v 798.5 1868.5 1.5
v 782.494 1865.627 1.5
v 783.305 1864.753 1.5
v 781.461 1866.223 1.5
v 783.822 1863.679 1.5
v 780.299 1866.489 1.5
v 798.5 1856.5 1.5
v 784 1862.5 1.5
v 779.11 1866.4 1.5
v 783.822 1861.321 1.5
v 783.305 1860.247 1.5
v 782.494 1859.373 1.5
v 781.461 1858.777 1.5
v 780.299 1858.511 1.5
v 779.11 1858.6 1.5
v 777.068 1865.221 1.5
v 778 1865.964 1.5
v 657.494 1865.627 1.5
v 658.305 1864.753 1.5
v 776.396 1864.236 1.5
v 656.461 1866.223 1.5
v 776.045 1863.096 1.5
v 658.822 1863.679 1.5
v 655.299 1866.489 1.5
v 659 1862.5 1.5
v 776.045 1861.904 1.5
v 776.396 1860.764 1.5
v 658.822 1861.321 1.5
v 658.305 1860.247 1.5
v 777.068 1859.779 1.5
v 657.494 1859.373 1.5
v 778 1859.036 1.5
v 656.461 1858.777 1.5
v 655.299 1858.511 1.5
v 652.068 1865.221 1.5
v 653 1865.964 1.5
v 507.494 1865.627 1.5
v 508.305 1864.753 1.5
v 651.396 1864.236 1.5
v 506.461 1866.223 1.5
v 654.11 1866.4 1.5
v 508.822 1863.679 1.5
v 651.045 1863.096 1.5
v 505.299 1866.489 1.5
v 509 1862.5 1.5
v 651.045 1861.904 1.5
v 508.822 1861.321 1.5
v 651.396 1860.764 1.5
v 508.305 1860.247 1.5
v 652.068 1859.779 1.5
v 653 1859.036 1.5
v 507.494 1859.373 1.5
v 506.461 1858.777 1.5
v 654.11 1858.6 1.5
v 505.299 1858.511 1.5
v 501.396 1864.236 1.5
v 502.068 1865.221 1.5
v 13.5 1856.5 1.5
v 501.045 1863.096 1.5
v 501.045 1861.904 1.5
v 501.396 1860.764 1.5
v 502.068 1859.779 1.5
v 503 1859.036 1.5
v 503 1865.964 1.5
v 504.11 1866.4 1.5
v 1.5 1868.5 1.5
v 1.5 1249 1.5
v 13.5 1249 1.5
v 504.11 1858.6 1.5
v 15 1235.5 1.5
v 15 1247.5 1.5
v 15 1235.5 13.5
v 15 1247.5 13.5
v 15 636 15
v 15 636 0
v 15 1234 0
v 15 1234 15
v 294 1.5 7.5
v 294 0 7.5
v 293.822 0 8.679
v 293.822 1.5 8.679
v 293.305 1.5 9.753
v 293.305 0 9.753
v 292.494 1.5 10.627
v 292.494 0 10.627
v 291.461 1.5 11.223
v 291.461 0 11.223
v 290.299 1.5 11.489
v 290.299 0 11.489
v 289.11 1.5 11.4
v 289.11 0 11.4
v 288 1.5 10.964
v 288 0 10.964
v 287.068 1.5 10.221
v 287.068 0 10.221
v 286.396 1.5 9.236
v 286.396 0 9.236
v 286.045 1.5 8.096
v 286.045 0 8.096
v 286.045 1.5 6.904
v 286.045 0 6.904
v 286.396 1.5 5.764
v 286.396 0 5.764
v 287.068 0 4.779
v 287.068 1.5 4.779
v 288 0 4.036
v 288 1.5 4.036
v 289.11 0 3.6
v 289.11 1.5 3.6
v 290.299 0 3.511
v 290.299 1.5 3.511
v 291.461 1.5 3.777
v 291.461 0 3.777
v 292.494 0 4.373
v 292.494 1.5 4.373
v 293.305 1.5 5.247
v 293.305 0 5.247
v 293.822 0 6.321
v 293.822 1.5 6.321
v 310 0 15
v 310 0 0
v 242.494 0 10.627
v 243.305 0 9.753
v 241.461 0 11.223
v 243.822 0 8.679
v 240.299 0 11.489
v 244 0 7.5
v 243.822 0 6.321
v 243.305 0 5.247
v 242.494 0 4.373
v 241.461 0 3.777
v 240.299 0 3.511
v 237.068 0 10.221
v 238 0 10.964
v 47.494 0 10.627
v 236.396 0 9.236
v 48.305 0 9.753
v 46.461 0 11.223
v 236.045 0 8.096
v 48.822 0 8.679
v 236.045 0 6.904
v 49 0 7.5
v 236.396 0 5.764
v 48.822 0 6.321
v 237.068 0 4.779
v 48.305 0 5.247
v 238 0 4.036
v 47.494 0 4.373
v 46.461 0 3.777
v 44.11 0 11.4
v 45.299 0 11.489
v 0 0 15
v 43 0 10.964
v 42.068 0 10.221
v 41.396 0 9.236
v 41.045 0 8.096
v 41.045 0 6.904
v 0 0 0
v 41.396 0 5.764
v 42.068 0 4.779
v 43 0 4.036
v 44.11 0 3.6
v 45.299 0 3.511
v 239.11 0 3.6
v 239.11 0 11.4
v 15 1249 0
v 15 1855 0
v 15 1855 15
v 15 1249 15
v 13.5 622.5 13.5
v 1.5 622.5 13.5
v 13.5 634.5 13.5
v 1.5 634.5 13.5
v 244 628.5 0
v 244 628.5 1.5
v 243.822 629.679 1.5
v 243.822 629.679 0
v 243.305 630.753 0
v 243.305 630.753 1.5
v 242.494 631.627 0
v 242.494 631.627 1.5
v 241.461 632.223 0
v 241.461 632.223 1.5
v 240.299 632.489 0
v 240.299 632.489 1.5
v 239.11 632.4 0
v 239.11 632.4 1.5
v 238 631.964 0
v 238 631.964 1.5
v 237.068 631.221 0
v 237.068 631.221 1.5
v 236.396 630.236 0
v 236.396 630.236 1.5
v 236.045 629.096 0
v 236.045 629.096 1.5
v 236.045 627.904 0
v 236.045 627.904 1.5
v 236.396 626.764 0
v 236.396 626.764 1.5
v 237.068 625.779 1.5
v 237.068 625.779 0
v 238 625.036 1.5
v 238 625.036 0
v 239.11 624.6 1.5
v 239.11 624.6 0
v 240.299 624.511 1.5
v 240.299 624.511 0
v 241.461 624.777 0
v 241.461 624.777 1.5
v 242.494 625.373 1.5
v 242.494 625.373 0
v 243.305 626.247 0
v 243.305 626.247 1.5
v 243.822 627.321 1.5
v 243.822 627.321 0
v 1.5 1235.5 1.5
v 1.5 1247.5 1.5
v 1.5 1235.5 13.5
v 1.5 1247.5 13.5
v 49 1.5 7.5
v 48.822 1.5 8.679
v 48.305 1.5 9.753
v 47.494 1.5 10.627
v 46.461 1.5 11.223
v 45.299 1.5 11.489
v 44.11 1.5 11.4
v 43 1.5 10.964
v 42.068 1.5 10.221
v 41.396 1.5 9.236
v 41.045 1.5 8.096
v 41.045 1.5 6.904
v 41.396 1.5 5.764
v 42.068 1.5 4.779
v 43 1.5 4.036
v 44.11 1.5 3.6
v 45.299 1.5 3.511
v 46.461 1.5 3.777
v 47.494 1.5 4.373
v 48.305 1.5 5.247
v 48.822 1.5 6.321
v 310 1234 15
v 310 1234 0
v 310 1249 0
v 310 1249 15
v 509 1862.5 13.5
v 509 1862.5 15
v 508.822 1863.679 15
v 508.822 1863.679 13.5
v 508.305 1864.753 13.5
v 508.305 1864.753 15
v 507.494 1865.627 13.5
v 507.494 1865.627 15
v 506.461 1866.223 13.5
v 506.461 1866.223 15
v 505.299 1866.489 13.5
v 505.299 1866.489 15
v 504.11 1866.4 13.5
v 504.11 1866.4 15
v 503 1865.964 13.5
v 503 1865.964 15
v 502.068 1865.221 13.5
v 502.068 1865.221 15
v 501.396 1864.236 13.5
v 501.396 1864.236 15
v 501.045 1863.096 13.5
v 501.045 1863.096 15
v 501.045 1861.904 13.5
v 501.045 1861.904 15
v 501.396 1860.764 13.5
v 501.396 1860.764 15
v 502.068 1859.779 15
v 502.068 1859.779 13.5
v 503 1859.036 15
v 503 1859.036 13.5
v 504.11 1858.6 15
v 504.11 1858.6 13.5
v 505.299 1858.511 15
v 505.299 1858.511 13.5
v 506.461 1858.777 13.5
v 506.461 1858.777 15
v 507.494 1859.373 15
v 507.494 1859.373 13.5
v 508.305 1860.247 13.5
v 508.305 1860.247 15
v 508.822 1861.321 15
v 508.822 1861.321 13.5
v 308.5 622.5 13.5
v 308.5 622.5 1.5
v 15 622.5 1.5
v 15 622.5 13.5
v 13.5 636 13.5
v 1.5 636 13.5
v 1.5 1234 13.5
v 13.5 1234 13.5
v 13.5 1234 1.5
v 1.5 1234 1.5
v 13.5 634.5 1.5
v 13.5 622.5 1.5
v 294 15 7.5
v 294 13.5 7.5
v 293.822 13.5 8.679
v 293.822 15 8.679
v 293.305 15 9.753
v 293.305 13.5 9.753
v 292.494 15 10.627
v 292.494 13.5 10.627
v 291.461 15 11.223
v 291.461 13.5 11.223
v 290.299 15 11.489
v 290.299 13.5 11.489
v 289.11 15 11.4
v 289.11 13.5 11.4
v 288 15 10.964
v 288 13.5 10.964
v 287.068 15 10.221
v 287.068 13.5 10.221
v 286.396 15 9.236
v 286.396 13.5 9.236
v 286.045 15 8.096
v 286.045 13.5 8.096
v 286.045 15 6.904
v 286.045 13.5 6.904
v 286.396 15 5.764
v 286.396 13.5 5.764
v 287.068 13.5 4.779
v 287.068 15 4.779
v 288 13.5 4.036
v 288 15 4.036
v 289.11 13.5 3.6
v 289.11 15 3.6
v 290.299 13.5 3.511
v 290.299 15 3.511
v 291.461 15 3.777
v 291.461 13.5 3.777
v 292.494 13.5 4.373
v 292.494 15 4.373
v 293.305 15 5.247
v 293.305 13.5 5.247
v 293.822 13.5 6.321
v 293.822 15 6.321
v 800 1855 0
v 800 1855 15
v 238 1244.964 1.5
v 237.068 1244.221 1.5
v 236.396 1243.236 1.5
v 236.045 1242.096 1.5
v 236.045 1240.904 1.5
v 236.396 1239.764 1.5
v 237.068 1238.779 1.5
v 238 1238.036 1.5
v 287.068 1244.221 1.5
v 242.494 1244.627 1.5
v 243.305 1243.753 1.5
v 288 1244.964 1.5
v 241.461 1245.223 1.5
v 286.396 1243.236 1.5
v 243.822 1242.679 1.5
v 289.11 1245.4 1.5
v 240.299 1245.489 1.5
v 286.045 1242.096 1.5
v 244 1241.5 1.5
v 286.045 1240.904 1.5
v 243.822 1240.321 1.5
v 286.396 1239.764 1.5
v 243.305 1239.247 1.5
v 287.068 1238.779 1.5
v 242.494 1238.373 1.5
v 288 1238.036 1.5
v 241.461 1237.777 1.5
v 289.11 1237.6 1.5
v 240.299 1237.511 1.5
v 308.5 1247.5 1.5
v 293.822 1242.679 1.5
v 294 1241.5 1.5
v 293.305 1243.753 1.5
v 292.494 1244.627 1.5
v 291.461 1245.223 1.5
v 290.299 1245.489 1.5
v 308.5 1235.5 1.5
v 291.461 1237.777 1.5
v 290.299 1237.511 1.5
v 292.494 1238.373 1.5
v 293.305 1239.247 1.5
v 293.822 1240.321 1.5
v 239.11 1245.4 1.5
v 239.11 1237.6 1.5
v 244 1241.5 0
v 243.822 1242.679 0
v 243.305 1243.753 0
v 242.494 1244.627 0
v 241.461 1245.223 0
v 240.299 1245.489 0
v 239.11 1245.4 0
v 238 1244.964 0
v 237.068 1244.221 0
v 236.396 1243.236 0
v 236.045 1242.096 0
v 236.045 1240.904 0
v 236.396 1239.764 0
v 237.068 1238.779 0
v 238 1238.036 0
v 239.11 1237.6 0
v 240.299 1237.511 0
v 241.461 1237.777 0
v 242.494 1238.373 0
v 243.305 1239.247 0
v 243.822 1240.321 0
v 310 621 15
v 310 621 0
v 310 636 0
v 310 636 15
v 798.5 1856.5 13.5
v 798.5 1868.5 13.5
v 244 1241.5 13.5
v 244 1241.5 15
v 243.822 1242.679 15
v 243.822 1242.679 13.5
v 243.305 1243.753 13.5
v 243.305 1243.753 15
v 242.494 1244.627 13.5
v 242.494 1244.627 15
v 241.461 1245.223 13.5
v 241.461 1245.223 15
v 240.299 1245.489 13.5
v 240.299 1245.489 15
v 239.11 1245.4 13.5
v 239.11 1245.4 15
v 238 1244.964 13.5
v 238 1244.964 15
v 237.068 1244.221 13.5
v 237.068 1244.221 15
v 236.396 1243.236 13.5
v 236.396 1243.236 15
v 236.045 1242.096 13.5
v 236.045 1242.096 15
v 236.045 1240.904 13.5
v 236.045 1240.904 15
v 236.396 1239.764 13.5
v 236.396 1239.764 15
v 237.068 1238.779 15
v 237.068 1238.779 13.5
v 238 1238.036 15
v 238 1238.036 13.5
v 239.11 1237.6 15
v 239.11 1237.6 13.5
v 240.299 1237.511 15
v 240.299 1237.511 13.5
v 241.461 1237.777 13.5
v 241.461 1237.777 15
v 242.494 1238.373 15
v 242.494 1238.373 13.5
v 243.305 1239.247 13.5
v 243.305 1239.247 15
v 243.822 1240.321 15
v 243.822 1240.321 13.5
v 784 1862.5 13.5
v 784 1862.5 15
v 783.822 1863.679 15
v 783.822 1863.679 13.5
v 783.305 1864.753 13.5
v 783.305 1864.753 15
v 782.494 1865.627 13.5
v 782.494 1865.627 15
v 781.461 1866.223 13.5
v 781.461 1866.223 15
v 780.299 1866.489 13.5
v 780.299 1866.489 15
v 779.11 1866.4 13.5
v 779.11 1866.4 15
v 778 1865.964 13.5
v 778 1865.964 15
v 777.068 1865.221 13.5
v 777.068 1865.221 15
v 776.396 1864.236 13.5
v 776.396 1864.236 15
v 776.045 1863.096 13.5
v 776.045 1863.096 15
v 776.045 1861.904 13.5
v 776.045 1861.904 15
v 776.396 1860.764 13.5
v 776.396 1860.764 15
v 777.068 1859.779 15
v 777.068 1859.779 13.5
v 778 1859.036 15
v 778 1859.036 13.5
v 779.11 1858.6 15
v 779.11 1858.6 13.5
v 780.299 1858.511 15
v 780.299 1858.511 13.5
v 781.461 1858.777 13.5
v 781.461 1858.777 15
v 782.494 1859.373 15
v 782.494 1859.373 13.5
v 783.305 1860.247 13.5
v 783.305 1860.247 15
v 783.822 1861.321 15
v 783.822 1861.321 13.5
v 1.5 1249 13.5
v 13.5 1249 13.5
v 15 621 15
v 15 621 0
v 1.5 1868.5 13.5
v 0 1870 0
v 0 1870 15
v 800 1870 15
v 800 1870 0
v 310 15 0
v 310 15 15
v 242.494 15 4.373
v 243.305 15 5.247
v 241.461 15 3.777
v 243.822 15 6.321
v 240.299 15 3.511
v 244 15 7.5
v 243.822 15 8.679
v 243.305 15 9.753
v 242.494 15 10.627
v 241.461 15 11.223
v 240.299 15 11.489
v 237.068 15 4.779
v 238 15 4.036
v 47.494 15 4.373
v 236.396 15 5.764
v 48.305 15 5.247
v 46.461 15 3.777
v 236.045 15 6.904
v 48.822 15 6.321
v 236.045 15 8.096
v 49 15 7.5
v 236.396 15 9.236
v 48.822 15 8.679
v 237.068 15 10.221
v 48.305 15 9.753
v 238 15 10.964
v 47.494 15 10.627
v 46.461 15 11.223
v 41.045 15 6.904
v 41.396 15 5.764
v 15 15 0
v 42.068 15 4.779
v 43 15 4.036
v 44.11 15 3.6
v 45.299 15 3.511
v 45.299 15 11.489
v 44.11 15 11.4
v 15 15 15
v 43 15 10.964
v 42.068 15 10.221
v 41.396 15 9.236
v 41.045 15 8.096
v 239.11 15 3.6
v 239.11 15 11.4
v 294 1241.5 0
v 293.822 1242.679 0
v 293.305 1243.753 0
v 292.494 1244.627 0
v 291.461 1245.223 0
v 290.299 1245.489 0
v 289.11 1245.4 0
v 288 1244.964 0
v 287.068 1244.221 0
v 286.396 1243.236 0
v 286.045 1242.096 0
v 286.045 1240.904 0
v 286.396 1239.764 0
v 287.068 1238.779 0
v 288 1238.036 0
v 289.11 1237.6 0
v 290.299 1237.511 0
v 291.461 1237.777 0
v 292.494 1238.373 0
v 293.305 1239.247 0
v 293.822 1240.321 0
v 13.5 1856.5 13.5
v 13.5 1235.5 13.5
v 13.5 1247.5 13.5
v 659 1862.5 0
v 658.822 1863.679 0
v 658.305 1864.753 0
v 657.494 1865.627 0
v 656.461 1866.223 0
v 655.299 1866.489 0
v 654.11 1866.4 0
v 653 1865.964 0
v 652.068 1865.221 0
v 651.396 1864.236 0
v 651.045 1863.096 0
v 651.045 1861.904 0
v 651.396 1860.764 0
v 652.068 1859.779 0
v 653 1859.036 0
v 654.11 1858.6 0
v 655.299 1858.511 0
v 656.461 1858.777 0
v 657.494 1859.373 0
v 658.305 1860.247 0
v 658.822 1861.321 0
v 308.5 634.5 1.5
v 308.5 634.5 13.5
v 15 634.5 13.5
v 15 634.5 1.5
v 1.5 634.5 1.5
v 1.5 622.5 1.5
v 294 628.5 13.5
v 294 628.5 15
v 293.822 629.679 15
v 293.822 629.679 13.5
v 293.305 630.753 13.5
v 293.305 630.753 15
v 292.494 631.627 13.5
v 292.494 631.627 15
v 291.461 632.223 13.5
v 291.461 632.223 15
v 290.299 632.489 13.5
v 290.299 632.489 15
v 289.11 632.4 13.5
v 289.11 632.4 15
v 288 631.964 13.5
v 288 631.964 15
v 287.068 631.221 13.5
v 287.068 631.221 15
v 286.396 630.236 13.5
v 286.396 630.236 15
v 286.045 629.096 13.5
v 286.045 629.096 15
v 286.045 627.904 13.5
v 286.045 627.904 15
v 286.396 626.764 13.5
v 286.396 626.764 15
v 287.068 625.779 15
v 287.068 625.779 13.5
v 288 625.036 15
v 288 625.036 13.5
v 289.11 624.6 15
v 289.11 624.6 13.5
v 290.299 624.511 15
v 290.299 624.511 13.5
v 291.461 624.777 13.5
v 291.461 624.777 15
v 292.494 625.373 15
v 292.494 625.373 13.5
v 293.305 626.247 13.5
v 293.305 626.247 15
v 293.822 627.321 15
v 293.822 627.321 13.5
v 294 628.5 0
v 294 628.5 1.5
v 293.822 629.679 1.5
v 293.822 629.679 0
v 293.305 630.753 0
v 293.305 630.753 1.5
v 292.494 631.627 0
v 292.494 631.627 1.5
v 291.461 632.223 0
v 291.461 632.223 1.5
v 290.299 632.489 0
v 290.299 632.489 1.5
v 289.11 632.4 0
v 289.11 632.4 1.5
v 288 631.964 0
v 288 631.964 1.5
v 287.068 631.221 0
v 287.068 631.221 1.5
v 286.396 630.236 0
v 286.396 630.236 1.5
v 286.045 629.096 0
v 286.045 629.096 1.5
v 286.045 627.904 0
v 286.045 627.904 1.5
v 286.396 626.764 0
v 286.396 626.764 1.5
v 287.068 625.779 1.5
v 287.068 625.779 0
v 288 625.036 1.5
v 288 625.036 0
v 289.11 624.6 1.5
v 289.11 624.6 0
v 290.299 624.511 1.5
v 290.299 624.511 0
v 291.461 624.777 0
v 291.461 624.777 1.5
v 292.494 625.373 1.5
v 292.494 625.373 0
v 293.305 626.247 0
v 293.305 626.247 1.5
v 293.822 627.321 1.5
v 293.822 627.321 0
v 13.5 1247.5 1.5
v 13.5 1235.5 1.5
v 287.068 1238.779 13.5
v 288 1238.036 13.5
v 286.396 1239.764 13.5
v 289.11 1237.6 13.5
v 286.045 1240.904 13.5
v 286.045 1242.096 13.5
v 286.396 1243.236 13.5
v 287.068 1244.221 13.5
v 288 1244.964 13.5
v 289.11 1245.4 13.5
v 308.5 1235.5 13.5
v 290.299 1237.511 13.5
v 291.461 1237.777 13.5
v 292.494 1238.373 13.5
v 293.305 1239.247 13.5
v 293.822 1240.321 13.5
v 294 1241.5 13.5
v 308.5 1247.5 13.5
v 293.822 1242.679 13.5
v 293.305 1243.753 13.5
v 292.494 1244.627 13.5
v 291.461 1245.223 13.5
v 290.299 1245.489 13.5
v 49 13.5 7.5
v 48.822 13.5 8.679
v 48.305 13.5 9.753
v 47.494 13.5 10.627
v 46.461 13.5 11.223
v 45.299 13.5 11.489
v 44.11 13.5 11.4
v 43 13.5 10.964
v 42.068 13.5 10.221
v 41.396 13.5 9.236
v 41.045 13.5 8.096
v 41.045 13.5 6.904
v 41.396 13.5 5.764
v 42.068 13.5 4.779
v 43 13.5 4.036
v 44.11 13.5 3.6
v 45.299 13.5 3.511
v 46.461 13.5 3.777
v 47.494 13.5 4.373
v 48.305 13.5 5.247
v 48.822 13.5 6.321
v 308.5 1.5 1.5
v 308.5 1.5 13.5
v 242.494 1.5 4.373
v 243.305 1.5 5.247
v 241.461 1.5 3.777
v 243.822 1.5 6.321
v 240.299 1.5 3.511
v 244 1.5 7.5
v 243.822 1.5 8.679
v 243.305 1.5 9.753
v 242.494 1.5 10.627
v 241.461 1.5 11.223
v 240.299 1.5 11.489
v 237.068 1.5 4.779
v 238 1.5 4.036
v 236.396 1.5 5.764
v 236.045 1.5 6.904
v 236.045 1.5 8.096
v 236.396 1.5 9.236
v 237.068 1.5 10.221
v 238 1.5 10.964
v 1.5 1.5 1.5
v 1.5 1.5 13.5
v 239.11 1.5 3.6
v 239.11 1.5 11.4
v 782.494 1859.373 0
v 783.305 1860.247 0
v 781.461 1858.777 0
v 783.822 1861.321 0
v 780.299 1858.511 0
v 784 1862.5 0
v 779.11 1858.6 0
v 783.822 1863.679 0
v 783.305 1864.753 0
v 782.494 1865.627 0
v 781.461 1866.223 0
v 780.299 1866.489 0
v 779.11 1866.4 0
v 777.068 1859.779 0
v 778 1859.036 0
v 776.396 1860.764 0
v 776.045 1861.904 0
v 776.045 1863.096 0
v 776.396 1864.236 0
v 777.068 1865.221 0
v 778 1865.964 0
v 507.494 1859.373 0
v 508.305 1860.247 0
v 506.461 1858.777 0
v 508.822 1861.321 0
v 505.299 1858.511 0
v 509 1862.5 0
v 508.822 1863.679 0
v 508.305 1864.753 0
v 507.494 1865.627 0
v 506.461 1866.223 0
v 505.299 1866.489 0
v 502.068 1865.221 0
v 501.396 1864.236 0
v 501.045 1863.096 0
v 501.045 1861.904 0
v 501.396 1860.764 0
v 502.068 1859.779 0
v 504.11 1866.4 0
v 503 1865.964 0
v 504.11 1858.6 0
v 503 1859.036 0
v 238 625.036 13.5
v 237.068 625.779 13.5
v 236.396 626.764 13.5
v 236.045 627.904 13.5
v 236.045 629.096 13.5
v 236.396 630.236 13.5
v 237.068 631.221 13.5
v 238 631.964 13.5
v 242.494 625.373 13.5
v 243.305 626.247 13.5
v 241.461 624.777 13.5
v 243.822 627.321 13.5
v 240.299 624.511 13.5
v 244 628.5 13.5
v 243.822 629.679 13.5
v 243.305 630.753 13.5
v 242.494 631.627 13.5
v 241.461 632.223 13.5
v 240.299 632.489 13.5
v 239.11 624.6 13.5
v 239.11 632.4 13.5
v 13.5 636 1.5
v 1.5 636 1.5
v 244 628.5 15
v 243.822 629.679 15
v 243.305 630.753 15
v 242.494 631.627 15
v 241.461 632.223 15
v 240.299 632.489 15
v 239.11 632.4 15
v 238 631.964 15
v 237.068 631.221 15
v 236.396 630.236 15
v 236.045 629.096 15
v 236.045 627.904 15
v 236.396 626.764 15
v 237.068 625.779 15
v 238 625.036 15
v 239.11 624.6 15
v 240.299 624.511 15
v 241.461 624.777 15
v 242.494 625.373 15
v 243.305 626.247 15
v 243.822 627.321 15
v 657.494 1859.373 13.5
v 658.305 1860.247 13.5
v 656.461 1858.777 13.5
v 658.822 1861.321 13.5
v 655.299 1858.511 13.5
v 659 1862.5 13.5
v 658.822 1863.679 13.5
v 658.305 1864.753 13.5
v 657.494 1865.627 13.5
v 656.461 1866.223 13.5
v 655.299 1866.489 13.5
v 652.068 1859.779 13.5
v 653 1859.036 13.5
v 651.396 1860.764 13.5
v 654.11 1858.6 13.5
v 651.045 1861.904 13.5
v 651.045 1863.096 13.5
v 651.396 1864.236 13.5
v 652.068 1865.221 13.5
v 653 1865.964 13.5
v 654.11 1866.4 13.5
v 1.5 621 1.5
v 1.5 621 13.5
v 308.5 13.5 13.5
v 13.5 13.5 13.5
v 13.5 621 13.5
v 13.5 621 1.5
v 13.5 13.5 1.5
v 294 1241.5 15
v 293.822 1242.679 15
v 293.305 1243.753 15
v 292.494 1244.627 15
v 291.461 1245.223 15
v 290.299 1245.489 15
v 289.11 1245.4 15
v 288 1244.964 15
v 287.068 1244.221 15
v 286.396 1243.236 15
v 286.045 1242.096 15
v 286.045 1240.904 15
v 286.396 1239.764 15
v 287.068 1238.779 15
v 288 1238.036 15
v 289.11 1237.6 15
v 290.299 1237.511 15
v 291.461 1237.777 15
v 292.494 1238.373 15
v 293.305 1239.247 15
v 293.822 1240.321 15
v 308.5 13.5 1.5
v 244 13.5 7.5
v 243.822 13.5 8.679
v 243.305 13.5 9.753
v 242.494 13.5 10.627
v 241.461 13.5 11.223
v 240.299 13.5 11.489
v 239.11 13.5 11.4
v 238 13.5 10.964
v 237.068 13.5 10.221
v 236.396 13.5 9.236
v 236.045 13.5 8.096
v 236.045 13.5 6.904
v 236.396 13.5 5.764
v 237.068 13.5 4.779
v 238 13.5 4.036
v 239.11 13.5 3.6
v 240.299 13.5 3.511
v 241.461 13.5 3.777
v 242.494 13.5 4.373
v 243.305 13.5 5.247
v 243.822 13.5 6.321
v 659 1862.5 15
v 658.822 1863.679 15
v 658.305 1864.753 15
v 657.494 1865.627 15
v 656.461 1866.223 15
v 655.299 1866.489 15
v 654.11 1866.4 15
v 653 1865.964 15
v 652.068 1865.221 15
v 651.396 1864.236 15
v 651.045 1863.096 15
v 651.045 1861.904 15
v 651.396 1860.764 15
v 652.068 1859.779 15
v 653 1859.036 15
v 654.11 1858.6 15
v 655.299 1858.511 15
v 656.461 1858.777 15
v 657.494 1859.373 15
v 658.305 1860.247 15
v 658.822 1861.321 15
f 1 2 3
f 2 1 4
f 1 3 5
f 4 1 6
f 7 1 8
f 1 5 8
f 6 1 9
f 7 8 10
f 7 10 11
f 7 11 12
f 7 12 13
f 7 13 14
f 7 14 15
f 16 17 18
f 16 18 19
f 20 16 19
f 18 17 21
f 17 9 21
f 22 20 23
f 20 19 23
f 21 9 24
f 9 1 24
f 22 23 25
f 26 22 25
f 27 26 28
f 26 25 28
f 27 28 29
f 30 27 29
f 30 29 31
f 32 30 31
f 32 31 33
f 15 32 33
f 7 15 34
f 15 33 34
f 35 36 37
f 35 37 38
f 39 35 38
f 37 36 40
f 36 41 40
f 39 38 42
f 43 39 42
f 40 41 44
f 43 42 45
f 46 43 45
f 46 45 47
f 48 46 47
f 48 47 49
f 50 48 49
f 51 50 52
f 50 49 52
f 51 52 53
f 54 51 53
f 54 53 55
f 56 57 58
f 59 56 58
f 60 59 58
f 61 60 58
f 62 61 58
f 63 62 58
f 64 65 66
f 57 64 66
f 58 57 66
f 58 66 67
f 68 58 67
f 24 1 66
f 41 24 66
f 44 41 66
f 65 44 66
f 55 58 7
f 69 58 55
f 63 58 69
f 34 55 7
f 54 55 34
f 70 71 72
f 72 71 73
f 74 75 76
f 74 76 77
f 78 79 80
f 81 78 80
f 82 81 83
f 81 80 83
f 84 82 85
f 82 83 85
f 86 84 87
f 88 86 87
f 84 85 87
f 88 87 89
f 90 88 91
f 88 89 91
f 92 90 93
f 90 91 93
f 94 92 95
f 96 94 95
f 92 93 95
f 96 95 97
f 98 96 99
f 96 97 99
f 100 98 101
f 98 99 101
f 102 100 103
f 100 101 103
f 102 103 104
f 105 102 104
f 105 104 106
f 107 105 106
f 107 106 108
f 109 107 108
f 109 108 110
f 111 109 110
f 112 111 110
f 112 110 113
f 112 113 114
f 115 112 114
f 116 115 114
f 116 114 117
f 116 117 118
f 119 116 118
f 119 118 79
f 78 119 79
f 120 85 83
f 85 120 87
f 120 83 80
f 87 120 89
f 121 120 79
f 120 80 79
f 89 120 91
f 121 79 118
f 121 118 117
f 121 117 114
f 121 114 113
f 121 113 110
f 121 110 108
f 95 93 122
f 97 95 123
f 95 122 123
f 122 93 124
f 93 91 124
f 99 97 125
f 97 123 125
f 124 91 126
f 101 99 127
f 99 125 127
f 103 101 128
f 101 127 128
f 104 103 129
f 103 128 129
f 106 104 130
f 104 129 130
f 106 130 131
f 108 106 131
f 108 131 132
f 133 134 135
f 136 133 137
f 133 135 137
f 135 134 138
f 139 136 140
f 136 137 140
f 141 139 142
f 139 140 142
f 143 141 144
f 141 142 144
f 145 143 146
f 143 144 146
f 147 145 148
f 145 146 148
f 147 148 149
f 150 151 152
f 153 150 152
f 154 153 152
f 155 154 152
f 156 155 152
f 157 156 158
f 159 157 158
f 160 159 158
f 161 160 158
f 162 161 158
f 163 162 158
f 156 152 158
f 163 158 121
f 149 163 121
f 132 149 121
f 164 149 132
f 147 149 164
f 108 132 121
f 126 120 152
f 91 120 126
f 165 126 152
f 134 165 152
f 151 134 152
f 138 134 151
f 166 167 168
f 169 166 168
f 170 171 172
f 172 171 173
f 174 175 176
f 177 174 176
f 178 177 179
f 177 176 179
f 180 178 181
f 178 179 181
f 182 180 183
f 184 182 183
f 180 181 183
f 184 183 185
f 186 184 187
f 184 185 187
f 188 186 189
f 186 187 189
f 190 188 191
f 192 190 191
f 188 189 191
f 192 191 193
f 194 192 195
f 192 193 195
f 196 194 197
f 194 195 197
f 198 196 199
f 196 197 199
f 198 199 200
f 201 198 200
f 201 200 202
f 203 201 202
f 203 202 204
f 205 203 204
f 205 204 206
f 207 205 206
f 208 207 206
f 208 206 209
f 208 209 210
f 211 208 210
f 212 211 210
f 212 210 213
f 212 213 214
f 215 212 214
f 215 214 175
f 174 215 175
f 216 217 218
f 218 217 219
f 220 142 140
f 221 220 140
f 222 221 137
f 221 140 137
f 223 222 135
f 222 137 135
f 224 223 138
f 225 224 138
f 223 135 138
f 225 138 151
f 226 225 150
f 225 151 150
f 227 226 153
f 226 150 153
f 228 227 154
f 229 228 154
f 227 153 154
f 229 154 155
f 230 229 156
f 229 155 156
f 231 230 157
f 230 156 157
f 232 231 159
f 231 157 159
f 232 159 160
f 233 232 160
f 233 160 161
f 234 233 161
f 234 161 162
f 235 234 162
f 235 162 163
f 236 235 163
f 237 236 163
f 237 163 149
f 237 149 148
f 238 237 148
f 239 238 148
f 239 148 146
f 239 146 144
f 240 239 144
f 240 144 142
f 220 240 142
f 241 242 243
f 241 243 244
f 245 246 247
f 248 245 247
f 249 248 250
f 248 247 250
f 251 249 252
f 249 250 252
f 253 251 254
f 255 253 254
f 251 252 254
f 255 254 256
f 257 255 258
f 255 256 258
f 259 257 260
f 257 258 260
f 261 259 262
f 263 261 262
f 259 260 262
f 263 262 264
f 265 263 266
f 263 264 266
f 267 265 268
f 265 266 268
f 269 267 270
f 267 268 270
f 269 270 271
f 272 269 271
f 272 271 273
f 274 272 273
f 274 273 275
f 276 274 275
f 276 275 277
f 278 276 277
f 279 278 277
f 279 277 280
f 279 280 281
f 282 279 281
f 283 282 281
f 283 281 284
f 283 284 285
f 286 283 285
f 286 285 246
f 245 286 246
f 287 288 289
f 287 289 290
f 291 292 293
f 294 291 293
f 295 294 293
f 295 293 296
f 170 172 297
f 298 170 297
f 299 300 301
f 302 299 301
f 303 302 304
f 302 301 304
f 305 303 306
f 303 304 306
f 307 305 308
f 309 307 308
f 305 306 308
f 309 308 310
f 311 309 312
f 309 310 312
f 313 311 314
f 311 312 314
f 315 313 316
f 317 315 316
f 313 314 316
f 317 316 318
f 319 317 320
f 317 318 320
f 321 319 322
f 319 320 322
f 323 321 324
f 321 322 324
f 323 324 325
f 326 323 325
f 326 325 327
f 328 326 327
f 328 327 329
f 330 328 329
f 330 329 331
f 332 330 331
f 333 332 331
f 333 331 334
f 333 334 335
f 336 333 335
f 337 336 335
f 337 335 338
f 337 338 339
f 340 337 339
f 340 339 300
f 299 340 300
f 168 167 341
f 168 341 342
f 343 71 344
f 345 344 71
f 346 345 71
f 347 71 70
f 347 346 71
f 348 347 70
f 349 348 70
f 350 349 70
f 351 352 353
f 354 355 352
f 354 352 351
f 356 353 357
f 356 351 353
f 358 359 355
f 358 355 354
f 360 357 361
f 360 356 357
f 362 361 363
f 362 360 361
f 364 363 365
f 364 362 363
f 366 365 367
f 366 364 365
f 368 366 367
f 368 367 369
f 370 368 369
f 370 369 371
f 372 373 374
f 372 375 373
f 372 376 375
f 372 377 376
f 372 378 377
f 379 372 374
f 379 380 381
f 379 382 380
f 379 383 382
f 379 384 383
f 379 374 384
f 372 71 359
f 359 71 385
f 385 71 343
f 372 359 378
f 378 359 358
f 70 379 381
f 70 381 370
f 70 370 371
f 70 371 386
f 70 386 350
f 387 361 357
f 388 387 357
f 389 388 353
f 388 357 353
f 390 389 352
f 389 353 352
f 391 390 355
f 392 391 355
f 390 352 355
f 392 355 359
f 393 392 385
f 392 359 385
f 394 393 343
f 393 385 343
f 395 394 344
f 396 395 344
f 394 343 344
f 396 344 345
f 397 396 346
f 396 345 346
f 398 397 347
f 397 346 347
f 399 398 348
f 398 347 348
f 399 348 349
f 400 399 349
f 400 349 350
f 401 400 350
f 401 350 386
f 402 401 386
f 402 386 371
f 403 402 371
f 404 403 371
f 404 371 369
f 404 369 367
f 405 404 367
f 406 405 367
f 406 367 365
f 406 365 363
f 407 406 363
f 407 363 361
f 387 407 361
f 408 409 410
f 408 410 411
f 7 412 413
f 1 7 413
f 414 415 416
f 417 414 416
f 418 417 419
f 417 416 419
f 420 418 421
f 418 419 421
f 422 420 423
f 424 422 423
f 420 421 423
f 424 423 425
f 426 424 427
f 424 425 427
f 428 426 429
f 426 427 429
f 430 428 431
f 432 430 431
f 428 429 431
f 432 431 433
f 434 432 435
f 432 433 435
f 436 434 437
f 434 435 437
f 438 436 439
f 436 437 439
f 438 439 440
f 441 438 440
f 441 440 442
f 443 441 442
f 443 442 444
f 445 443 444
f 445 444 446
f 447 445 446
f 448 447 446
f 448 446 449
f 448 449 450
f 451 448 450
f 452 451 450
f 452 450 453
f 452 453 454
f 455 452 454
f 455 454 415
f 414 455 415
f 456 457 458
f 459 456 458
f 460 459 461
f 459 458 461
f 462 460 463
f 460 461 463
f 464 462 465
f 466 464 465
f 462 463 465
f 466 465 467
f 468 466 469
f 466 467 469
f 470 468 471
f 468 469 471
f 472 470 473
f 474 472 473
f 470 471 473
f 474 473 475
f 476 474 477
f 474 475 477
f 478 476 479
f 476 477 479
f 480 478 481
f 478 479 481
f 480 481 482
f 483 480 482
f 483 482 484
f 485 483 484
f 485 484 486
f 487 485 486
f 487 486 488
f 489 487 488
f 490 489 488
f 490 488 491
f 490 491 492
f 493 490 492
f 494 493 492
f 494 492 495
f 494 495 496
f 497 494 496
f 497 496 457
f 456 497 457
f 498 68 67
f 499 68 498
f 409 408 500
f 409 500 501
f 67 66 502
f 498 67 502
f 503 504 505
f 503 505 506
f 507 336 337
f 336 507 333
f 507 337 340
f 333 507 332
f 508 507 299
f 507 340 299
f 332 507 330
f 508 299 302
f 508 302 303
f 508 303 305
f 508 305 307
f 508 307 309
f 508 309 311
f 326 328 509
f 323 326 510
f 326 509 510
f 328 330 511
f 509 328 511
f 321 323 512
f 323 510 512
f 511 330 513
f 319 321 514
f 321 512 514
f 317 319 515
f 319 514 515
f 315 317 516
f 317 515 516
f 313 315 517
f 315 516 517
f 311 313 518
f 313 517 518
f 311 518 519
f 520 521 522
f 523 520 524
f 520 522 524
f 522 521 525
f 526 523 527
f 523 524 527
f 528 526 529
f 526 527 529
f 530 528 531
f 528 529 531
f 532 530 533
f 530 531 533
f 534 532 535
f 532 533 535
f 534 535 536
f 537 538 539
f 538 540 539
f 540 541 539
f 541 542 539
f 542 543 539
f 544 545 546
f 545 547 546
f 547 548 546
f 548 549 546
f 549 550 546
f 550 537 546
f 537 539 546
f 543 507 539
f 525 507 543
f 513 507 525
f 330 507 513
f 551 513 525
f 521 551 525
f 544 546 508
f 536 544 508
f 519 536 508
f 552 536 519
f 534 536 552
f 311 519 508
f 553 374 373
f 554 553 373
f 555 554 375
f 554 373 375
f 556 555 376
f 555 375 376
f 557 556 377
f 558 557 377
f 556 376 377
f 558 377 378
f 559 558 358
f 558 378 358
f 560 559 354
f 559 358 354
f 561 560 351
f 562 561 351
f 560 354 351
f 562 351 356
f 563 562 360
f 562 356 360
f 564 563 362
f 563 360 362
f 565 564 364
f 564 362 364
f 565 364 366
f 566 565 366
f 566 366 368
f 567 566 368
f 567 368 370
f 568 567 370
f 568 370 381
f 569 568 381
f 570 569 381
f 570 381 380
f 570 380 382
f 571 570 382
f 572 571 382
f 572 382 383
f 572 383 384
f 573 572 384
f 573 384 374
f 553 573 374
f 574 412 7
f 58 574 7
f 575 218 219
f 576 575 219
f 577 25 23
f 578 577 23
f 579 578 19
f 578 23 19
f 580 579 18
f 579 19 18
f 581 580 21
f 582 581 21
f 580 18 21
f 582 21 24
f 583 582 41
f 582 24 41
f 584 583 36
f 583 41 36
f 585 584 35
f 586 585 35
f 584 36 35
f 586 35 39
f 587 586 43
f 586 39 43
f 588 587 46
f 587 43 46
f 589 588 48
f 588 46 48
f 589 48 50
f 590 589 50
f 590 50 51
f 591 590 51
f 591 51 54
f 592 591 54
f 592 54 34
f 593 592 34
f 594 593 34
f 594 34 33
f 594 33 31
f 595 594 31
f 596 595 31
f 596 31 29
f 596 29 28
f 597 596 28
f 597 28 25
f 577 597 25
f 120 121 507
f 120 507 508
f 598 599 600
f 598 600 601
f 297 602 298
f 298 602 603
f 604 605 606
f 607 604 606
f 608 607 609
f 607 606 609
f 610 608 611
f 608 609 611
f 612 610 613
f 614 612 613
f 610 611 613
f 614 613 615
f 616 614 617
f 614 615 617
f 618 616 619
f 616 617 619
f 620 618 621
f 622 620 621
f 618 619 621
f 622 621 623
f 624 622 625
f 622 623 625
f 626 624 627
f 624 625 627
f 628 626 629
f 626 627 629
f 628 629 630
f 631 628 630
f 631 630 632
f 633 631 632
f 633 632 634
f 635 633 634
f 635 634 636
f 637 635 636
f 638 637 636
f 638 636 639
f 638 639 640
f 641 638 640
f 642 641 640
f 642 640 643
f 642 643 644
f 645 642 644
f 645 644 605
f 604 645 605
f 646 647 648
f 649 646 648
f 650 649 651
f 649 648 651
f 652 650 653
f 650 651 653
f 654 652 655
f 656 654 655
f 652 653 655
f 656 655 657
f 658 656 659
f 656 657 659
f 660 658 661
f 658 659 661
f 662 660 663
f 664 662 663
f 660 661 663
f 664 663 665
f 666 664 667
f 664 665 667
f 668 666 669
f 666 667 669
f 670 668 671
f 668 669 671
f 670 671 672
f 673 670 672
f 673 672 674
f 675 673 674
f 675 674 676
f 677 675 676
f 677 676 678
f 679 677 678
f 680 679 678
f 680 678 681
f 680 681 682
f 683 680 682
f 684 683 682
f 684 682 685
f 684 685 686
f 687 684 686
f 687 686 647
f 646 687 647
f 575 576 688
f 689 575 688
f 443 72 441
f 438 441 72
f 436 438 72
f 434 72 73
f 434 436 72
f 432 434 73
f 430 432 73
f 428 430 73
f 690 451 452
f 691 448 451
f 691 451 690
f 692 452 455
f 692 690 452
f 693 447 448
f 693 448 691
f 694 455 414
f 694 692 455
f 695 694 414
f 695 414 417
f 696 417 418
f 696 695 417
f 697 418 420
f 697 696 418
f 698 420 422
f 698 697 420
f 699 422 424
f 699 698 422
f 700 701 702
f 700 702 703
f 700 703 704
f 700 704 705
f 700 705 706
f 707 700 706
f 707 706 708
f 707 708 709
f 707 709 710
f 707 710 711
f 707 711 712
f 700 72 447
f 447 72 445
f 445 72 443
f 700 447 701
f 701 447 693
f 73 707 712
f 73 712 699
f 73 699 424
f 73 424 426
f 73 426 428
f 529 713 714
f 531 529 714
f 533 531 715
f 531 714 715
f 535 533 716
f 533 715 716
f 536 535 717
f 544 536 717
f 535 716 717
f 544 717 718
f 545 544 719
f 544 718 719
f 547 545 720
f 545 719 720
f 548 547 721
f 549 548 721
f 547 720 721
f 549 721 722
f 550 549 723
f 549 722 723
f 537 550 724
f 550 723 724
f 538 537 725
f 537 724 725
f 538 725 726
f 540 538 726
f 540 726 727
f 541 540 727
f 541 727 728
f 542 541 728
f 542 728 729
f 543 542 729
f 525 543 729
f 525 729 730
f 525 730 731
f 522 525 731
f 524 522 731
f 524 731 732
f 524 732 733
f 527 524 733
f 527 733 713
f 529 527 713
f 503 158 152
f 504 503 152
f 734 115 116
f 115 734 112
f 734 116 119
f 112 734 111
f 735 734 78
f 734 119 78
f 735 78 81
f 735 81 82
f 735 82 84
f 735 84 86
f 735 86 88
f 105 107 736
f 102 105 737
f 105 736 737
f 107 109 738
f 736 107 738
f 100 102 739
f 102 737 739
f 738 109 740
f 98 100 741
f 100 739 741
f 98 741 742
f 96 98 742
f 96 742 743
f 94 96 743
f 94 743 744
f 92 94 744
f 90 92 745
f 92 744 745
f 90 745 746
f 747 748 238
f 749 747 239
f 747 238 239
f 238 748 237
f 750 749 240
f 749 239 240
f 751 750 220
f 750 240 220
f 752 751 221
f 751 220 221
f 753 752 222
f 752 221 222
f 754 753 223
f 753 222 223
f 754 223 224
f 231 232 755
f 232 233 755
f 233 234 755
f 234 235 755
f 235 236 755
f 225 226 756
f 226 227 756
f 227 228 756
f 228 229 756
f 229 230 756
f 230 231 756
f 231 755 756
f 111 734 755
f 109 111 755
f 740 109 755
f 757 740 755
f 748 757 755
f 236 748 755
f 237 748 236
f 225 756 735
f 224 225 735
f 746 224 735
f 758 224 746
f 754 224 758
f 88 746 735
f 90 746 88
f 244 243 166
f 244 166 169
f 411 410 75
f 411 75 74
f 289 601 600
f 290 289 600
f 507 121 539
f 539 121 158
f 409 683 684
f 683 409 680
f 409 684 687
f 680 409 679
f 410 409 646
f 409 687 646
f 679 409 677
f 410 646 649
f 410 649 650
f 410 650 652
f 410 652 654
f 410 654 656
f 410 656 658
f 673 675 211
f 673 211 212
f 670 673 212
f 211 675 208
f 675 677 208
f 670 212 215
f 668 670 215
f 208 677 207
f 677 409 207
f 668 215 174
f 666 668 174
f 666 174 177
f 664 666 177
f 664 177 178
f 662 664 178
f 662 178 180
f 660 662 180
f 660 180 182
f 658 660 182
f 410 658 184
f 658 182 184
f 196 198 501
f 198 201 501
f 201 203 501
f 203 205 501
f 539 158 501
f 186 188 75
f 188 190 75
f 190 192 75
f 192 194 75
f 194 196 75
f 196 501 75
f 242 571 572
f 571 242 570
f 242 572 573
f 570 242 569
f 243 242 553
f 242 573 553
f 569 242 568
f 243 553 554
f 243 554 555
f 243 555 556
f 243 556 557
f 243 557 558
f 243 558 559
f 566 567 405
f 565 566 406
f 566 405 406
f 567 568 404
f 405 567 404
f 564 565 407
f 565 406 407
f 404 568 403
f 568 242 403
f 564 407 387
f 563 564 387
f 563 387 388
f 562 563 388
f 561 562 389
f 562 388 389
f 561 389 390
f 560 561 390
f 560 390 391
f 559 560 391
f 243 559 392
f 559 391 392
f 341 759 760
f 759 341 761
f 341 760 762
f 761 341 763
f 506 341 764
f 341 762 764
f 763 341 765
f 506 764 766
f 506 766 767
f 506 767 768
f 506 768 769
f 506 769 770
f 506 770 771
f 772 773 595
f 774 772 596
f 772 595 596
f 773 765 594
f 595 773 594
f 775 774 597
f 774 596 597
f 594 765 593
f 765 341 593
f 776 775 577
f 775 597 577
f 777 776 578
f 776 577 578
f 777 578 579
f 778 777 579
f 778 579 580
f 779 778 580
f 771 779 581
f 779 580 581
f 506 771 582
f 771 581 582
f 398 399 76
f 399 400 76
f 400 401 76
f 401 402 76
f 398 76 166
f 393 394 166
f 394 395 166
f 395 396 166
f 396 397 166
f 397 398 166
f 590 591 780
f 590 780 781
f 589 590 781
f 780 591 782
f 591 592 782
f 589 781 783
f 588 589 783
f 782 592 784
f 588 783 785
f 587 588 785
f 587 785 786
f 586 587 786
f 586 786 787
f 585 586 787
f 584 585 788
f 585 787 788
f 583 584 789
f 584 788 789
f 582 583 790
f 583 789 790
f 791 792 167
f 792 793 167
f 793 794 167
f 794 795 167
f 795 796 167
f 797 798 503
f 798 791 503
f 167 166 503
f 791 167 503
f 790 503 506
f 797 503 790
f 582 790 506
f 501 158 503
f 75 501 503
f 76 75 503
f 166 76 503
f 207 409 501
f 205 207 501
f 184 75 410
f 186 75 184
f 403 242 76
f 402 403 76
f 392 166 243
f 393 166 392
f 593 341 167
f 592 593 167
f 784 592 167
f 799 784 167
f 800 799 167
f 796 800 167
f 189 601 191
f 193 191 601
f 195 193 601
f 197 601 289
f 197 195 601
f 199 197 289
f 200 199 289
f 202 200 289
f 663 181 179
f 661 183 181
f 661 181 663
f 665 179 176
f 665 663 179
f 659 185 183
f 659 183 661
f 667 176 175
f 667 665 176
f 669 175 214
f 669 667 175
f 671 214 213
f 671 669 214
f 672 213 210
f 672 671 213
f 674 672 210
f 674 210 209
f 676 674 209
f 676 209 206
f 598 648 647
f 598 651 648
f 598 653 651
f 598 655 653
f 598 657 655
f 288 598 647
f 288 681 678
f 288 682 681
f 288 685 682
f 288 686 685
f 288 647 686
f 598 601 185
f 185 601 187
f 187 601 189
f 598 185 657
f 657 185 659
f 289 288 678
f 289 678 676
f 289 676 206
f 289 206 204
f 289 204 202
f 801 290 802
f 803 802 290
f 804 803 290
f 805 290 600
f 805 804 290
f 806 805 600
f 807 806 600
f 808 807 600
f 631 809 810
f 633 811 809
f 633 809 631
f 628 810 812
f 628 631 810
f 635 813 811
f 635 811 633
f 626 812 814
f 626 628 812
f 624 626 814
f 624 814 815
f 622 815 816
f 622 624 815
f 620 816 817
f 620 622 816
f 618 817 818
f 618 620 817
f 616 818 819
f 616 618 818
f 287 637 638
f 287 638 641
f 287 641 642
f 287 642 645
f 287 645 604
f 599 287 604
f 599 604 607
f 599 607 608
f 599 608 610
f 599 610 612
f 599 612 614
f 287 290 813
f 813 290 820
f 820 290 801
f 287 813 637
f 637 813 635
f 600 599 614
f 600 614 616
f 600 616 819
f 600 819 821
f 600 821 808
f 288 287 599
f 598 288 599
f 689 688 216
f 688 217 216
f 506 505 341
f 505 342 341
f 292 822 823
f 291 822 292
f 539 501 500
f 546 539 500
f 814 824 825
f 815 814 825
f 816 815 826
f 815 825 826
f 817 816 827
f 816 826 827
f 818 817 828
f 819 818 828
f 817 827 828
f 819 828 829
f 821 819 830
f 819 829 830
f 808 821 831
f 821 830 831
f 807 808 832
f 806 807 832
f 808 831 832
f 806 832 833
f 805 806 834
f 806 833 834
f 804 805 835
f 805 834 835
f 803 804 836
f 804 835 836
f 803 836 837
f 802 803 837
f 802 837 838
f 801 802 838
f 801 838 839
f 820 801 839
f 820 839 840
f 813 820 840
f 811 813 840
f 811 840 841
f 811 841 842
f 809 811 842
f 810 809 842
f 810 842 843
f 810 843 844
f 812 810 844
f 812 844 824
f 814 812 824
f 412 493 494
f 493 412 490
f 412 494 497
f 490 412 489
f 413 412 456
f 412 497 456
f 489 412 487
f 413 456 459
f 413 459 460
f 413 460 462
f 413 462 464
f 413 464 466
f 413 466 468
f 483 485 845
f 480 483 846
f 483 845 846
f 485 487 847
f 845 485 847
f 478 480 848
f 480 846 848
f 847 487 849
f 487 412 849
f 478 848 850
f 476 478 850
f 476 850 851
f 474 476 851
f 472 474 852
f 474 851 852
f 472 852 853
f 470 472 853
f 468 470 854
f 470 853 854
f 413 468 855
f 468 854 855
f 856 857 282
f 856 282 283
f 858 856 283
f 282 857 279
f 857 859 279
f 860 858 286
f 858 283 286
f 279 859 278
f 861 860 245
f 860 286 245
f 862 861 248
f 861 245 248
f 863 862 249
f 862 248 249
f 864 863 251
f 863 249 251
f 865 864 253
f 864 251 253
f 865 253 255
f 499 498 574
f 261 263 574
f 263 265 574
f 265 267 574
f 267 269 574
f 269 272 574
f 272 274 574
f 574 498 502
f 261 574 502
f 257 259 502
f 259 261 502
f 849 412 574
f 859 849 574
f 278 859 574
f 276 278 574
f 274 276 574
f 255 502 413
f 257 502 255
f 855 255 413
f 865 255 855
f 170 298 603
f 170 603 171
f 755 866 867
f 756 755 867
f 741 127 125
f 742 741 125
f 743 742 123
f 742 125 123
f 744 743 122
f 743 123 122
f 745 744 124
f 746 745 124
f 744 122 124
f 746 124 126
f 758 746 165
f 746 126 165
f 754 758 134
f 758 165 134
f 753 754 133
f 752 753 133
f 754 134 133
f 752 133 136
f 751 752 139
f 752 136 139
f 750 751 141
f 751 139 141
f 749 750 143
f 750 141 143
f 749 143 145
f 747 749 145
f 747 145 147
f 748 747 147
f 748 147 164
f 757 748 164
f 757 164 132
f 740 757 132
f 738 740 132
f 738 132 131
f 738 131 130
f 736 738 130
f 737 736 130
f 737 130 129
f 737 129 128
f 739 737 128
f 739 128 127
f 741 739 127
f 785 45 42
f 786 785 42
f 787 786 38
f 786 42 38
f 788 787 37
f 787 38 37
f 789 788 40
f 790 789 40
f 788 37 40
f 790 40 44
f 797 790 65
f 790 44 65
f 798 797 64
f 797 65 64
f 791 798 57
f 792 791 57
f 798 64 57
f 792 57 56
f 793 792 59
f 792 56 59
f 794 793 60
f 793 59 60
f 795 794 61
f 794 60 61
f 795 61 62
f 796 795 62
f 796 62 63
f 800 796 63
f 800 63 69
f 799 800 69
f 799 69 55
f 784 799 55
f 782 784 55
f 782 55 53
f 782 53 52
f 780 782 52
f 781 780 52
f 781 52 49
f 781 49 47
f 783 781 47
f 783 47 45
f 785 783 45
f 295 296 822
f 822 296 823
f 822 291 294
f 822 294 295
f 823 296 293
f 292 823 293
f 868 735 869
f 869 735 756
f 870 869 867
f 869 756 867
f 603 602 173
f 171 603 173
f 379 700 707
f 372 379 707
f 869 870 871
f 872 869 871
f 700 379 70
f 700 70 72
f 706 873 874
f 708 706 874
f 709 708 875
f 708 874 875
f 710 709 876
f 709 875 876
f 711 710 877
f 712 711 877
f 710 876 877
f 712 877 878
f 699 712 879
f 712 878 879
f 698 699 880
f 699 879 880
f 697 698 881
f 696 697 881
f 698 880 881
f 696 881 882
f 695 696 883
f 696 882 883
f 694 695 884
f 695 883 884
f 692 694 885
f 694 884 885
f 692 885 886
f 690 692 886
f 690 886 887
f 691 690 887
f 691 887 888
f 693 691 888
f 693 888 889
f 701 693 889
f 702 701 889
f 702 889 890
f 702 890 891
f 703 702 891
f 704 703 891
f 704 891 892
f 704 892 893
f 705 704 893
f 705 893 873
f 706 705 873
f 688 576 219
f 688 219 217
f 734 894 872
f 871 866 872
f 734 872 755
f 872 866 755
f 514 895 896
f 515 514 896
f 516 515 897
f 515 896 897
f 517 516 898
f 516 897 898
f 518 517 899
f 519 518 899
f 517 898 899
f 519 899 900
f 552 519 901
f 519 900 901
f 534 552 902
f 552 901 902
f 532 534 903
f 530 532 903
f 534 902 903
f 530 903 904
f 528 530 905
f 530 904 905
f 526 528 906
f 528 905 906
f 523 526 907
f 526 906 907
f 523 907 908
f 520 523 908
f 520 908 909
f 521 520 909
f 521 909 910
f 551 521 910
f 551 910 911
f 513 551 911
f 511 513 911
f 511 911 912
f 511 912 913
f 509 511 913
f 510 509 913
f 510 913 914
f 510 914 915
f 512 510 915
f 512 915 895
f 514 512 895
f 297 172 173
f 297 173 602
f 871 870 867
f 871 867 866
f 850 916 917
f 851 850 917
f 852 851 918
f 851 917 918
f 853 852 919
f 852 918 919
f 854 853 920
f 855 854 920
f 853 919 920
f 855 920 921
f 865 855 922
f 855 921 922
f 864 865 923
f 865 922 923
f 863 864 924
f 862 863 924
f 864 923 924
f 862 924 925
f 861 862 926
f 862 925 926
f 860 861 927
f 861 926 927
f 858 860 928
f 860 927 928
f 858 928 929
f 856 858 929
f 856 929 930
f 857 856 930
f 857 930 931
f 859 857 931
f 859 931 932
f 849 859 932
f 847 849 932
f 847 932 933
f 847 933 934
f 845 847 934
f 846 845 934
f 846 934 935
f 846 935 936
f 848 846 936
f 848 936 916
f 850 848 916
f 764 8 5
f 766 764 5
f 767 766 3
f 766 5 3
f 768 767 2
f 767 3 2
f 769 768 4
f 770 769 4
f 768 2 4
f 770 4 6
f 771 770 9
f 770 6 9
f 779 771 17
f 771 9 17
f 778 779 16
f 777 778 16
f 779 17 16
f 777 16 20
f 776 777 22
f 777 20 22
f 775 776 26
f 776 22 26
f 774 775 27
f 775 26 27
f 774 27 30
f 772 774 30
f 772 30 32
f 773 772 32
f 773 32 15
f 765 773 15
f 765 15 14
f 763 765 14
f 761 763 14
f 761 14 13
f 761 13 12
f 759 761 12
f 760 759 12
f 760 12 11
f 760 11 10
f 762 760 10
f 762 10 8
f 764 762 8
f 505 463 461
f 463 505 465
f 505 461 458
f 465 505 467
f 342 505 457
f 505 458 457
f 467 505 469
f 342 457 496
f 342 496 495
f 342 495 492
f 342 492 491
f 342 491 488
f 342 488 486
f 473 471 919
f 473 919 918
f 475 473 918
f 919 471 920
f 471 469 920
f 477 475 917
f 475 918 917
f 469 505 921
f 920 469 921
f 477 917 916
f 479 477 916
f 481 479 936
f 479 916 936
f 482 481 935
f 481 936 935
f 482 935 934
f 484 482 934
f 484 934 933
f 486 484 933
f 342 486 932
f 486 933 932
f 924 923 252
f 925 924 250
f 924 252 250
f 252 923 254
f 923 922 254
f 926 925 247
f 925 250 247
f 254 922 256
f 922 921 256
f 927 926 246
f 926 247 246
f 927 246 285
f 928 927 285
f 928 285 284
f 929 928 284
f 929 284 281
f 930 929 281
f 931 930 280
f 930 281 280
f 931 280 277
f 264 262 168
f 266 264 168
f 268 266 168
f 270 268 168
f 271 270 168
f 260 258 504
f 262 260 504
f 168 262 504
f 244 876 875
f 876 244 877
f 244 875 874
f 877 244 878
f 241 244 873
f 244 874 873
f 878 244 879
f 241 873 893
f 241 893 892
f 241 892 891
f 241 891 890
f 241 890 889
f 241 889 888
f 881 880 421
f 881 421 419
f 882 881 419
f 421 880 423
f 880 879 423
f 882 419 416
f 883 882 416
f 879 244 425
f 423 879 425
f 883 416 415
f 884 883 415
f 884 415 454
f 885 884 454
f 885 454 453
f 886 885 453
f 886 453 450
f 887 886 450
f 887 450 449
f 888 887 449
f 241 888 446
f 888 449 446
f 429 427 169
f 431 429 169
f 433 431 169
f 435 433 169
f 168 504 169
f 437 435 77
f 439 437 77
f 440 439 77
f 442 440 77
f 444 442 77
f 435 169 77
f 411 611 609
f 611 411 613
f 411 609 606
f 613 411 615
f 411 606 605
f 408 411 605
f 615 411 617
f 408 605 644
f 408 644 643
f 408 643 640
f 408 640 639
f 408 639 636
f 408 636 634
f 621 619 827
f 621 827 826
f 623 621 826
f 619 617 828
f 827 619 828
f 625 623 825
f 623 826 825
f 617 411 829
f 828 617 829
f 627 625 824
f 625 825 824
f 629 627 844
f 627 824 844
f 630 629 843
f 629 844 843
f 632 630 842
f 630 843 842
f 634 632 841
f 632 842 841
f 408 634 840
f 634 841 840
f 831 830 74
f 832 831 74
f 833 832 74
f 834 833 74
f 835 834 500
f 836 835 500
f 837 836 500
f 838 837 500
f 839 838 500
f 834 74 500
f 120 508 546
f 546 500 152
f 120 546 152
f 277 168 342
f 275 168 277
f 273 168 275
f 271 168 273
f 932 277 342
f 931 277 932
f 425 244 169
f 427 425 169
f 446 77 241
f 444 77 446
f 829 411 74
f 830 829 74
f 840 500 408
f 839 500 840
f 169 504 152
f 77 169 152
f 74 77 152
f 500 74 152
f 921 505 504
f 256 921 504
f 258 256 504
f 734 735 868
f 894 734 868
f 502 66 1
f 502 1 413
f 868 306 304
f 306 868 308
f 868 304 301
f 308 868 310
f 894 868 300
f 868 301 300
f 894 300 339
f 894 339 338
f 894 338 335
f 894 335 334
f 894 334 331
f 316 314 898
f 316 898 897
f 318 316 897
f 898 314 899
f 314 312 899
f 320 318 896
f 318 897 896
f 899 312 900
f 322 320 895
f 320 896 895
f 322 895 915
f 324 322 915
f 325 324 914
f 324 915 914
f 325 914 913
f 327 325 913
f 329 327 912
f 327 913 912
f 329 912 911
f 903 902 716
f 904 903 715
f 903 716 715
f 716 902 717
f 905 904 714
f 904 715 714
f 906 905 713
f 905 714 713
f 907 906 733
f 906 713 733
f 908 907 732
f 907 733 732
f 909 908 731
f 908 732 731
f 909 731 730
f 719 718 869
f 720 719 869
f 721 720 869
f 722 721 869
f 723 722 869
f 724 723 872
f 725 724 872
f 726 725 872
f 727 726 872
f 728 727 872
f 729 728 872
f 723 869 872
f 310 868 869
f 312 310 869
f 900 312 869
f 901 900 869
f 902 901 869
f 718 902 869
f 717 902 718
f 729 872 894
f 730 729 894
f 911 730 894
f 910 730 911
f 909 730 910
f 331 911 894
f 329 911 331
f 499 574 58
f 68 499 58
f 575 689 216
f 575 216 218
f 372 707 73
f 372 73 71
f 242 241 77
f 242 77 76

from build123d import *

# Parameters (mm, degrees)
F1_W      = 15
F1_H      = 15
F1_W_2    = 12
F1_H_2    = 12
F4_W      = 15
F4_H      = 15
F5_DEPTH  = 1.5
F6_W      = 15
F6_H      = 15
F7_DEPTH  = 1.5
F8_R      = 4
F9_DEPTH  = 15
F10_R     = 4
F11_DEPTH = 15


with BuildPart() as f2:
    # F2: sweep along a path in F0
    with BuildLine(Plane.XY) as f2_path:
        Line((310, 0), (0, 0))
        Line((0, 0), (0, 1870))
        Line((0, 1870), (800, 1870))
    # F1 (on Right) → F2 (sweep)
    with BuildSketch(Plane.YZ):
        with Locations((7.5, 7.5)):
            Rectangle(F1_W, F1_H)
        with Locations((7.5, 7.5)):
            Rectangle(F1_W_2, F1_H_2, mode=Mode.SUBTRACT)
    sweep(path=f2_path.line, transition=Transition.RIGHT)

    # F3: sweep along a path in F0
    with BuildLine(Plane.XY) as f3_path:
        Line((0, 628.5), (310, 628.5))
    # F1 (on Right) → F3 (sweep)
    with BuildSketch(Plane.YZ):
        with Locations((628.5, 7.5)):
            Rectangle(F1_W, F1_H)
        with Locations((628.5, 7.5)):
            Rectangle(F1_W_2, F1_H_2, mode=Mode.SUBTRACT)
        with Locations((1241.5, 7.5)):
            Rectangle(F1_W, F1_H)
        with Locations((1241.5, 7.5)):
            Rectangle(F1_W_2, F1_H_2, mode=Mode.SUBTRACT)
    sweep(path=f3_path.line)

    # F4 (on face) → F5 (join)
    with BuildSketch(Plane.YZ.offset(310)):
        with Locations((7.5, 7.5)):
            Rectangle(F4_W, F4_H)
        with Locations((628.5, 7.5)):
            Rectangle(F4_W, F4_H)
        with Locations((1241.5, 7.5)):
            Rectangle(F4_W, F4_H)
    extrude(amount=-F5_DEPTH)

    # F6 (on face) → F7 (join)
    with BuildSketch(Plane.YZ.offset(800)):
        with Locations((1862.5, 7.5)):
            Rectangle(F6_W, F6_H)
    extrude(amount=-F7_DEPTH)

    # F8 (on face) → F9 (cut, through all)
    with BuildSketch(Plane.XY.offset(15)):
        with Locations((290, 628.5)):
            Circle(F8_R)
        with Locations((240, 628.5)):
            Circle(F8_R)
        with Locations((290, 1241.5)):
            Circle(F8_R)
        with Locations((240, 1241.5)):
            Circle(F8_R)
        with Locations((780, 1862.5)):
            Circle(F8_R)
        with Locations((655, 1862.5)):
            Circle(F8_R)
        with Locations((505, 1862.5)):
            Circle(F8_R)
    extrude(amount=-F9_DEPTH, mode=Mode.SUBTRACT)

    # F10 (on face) → F11 (cut, through all)
    with BuildSketch(Plane.XZ):
        with Locations((290, 7.5)):
            Circle(F10_R)
        with Locations((240, 7.5)):
            Circle(F10_R)
        with Locations((45, 7.5)):
            Circle(F10_R)
    extrude(amount=-F11_DEPTH, mode=Mode.SUBTRACT)


solid = f2.part
